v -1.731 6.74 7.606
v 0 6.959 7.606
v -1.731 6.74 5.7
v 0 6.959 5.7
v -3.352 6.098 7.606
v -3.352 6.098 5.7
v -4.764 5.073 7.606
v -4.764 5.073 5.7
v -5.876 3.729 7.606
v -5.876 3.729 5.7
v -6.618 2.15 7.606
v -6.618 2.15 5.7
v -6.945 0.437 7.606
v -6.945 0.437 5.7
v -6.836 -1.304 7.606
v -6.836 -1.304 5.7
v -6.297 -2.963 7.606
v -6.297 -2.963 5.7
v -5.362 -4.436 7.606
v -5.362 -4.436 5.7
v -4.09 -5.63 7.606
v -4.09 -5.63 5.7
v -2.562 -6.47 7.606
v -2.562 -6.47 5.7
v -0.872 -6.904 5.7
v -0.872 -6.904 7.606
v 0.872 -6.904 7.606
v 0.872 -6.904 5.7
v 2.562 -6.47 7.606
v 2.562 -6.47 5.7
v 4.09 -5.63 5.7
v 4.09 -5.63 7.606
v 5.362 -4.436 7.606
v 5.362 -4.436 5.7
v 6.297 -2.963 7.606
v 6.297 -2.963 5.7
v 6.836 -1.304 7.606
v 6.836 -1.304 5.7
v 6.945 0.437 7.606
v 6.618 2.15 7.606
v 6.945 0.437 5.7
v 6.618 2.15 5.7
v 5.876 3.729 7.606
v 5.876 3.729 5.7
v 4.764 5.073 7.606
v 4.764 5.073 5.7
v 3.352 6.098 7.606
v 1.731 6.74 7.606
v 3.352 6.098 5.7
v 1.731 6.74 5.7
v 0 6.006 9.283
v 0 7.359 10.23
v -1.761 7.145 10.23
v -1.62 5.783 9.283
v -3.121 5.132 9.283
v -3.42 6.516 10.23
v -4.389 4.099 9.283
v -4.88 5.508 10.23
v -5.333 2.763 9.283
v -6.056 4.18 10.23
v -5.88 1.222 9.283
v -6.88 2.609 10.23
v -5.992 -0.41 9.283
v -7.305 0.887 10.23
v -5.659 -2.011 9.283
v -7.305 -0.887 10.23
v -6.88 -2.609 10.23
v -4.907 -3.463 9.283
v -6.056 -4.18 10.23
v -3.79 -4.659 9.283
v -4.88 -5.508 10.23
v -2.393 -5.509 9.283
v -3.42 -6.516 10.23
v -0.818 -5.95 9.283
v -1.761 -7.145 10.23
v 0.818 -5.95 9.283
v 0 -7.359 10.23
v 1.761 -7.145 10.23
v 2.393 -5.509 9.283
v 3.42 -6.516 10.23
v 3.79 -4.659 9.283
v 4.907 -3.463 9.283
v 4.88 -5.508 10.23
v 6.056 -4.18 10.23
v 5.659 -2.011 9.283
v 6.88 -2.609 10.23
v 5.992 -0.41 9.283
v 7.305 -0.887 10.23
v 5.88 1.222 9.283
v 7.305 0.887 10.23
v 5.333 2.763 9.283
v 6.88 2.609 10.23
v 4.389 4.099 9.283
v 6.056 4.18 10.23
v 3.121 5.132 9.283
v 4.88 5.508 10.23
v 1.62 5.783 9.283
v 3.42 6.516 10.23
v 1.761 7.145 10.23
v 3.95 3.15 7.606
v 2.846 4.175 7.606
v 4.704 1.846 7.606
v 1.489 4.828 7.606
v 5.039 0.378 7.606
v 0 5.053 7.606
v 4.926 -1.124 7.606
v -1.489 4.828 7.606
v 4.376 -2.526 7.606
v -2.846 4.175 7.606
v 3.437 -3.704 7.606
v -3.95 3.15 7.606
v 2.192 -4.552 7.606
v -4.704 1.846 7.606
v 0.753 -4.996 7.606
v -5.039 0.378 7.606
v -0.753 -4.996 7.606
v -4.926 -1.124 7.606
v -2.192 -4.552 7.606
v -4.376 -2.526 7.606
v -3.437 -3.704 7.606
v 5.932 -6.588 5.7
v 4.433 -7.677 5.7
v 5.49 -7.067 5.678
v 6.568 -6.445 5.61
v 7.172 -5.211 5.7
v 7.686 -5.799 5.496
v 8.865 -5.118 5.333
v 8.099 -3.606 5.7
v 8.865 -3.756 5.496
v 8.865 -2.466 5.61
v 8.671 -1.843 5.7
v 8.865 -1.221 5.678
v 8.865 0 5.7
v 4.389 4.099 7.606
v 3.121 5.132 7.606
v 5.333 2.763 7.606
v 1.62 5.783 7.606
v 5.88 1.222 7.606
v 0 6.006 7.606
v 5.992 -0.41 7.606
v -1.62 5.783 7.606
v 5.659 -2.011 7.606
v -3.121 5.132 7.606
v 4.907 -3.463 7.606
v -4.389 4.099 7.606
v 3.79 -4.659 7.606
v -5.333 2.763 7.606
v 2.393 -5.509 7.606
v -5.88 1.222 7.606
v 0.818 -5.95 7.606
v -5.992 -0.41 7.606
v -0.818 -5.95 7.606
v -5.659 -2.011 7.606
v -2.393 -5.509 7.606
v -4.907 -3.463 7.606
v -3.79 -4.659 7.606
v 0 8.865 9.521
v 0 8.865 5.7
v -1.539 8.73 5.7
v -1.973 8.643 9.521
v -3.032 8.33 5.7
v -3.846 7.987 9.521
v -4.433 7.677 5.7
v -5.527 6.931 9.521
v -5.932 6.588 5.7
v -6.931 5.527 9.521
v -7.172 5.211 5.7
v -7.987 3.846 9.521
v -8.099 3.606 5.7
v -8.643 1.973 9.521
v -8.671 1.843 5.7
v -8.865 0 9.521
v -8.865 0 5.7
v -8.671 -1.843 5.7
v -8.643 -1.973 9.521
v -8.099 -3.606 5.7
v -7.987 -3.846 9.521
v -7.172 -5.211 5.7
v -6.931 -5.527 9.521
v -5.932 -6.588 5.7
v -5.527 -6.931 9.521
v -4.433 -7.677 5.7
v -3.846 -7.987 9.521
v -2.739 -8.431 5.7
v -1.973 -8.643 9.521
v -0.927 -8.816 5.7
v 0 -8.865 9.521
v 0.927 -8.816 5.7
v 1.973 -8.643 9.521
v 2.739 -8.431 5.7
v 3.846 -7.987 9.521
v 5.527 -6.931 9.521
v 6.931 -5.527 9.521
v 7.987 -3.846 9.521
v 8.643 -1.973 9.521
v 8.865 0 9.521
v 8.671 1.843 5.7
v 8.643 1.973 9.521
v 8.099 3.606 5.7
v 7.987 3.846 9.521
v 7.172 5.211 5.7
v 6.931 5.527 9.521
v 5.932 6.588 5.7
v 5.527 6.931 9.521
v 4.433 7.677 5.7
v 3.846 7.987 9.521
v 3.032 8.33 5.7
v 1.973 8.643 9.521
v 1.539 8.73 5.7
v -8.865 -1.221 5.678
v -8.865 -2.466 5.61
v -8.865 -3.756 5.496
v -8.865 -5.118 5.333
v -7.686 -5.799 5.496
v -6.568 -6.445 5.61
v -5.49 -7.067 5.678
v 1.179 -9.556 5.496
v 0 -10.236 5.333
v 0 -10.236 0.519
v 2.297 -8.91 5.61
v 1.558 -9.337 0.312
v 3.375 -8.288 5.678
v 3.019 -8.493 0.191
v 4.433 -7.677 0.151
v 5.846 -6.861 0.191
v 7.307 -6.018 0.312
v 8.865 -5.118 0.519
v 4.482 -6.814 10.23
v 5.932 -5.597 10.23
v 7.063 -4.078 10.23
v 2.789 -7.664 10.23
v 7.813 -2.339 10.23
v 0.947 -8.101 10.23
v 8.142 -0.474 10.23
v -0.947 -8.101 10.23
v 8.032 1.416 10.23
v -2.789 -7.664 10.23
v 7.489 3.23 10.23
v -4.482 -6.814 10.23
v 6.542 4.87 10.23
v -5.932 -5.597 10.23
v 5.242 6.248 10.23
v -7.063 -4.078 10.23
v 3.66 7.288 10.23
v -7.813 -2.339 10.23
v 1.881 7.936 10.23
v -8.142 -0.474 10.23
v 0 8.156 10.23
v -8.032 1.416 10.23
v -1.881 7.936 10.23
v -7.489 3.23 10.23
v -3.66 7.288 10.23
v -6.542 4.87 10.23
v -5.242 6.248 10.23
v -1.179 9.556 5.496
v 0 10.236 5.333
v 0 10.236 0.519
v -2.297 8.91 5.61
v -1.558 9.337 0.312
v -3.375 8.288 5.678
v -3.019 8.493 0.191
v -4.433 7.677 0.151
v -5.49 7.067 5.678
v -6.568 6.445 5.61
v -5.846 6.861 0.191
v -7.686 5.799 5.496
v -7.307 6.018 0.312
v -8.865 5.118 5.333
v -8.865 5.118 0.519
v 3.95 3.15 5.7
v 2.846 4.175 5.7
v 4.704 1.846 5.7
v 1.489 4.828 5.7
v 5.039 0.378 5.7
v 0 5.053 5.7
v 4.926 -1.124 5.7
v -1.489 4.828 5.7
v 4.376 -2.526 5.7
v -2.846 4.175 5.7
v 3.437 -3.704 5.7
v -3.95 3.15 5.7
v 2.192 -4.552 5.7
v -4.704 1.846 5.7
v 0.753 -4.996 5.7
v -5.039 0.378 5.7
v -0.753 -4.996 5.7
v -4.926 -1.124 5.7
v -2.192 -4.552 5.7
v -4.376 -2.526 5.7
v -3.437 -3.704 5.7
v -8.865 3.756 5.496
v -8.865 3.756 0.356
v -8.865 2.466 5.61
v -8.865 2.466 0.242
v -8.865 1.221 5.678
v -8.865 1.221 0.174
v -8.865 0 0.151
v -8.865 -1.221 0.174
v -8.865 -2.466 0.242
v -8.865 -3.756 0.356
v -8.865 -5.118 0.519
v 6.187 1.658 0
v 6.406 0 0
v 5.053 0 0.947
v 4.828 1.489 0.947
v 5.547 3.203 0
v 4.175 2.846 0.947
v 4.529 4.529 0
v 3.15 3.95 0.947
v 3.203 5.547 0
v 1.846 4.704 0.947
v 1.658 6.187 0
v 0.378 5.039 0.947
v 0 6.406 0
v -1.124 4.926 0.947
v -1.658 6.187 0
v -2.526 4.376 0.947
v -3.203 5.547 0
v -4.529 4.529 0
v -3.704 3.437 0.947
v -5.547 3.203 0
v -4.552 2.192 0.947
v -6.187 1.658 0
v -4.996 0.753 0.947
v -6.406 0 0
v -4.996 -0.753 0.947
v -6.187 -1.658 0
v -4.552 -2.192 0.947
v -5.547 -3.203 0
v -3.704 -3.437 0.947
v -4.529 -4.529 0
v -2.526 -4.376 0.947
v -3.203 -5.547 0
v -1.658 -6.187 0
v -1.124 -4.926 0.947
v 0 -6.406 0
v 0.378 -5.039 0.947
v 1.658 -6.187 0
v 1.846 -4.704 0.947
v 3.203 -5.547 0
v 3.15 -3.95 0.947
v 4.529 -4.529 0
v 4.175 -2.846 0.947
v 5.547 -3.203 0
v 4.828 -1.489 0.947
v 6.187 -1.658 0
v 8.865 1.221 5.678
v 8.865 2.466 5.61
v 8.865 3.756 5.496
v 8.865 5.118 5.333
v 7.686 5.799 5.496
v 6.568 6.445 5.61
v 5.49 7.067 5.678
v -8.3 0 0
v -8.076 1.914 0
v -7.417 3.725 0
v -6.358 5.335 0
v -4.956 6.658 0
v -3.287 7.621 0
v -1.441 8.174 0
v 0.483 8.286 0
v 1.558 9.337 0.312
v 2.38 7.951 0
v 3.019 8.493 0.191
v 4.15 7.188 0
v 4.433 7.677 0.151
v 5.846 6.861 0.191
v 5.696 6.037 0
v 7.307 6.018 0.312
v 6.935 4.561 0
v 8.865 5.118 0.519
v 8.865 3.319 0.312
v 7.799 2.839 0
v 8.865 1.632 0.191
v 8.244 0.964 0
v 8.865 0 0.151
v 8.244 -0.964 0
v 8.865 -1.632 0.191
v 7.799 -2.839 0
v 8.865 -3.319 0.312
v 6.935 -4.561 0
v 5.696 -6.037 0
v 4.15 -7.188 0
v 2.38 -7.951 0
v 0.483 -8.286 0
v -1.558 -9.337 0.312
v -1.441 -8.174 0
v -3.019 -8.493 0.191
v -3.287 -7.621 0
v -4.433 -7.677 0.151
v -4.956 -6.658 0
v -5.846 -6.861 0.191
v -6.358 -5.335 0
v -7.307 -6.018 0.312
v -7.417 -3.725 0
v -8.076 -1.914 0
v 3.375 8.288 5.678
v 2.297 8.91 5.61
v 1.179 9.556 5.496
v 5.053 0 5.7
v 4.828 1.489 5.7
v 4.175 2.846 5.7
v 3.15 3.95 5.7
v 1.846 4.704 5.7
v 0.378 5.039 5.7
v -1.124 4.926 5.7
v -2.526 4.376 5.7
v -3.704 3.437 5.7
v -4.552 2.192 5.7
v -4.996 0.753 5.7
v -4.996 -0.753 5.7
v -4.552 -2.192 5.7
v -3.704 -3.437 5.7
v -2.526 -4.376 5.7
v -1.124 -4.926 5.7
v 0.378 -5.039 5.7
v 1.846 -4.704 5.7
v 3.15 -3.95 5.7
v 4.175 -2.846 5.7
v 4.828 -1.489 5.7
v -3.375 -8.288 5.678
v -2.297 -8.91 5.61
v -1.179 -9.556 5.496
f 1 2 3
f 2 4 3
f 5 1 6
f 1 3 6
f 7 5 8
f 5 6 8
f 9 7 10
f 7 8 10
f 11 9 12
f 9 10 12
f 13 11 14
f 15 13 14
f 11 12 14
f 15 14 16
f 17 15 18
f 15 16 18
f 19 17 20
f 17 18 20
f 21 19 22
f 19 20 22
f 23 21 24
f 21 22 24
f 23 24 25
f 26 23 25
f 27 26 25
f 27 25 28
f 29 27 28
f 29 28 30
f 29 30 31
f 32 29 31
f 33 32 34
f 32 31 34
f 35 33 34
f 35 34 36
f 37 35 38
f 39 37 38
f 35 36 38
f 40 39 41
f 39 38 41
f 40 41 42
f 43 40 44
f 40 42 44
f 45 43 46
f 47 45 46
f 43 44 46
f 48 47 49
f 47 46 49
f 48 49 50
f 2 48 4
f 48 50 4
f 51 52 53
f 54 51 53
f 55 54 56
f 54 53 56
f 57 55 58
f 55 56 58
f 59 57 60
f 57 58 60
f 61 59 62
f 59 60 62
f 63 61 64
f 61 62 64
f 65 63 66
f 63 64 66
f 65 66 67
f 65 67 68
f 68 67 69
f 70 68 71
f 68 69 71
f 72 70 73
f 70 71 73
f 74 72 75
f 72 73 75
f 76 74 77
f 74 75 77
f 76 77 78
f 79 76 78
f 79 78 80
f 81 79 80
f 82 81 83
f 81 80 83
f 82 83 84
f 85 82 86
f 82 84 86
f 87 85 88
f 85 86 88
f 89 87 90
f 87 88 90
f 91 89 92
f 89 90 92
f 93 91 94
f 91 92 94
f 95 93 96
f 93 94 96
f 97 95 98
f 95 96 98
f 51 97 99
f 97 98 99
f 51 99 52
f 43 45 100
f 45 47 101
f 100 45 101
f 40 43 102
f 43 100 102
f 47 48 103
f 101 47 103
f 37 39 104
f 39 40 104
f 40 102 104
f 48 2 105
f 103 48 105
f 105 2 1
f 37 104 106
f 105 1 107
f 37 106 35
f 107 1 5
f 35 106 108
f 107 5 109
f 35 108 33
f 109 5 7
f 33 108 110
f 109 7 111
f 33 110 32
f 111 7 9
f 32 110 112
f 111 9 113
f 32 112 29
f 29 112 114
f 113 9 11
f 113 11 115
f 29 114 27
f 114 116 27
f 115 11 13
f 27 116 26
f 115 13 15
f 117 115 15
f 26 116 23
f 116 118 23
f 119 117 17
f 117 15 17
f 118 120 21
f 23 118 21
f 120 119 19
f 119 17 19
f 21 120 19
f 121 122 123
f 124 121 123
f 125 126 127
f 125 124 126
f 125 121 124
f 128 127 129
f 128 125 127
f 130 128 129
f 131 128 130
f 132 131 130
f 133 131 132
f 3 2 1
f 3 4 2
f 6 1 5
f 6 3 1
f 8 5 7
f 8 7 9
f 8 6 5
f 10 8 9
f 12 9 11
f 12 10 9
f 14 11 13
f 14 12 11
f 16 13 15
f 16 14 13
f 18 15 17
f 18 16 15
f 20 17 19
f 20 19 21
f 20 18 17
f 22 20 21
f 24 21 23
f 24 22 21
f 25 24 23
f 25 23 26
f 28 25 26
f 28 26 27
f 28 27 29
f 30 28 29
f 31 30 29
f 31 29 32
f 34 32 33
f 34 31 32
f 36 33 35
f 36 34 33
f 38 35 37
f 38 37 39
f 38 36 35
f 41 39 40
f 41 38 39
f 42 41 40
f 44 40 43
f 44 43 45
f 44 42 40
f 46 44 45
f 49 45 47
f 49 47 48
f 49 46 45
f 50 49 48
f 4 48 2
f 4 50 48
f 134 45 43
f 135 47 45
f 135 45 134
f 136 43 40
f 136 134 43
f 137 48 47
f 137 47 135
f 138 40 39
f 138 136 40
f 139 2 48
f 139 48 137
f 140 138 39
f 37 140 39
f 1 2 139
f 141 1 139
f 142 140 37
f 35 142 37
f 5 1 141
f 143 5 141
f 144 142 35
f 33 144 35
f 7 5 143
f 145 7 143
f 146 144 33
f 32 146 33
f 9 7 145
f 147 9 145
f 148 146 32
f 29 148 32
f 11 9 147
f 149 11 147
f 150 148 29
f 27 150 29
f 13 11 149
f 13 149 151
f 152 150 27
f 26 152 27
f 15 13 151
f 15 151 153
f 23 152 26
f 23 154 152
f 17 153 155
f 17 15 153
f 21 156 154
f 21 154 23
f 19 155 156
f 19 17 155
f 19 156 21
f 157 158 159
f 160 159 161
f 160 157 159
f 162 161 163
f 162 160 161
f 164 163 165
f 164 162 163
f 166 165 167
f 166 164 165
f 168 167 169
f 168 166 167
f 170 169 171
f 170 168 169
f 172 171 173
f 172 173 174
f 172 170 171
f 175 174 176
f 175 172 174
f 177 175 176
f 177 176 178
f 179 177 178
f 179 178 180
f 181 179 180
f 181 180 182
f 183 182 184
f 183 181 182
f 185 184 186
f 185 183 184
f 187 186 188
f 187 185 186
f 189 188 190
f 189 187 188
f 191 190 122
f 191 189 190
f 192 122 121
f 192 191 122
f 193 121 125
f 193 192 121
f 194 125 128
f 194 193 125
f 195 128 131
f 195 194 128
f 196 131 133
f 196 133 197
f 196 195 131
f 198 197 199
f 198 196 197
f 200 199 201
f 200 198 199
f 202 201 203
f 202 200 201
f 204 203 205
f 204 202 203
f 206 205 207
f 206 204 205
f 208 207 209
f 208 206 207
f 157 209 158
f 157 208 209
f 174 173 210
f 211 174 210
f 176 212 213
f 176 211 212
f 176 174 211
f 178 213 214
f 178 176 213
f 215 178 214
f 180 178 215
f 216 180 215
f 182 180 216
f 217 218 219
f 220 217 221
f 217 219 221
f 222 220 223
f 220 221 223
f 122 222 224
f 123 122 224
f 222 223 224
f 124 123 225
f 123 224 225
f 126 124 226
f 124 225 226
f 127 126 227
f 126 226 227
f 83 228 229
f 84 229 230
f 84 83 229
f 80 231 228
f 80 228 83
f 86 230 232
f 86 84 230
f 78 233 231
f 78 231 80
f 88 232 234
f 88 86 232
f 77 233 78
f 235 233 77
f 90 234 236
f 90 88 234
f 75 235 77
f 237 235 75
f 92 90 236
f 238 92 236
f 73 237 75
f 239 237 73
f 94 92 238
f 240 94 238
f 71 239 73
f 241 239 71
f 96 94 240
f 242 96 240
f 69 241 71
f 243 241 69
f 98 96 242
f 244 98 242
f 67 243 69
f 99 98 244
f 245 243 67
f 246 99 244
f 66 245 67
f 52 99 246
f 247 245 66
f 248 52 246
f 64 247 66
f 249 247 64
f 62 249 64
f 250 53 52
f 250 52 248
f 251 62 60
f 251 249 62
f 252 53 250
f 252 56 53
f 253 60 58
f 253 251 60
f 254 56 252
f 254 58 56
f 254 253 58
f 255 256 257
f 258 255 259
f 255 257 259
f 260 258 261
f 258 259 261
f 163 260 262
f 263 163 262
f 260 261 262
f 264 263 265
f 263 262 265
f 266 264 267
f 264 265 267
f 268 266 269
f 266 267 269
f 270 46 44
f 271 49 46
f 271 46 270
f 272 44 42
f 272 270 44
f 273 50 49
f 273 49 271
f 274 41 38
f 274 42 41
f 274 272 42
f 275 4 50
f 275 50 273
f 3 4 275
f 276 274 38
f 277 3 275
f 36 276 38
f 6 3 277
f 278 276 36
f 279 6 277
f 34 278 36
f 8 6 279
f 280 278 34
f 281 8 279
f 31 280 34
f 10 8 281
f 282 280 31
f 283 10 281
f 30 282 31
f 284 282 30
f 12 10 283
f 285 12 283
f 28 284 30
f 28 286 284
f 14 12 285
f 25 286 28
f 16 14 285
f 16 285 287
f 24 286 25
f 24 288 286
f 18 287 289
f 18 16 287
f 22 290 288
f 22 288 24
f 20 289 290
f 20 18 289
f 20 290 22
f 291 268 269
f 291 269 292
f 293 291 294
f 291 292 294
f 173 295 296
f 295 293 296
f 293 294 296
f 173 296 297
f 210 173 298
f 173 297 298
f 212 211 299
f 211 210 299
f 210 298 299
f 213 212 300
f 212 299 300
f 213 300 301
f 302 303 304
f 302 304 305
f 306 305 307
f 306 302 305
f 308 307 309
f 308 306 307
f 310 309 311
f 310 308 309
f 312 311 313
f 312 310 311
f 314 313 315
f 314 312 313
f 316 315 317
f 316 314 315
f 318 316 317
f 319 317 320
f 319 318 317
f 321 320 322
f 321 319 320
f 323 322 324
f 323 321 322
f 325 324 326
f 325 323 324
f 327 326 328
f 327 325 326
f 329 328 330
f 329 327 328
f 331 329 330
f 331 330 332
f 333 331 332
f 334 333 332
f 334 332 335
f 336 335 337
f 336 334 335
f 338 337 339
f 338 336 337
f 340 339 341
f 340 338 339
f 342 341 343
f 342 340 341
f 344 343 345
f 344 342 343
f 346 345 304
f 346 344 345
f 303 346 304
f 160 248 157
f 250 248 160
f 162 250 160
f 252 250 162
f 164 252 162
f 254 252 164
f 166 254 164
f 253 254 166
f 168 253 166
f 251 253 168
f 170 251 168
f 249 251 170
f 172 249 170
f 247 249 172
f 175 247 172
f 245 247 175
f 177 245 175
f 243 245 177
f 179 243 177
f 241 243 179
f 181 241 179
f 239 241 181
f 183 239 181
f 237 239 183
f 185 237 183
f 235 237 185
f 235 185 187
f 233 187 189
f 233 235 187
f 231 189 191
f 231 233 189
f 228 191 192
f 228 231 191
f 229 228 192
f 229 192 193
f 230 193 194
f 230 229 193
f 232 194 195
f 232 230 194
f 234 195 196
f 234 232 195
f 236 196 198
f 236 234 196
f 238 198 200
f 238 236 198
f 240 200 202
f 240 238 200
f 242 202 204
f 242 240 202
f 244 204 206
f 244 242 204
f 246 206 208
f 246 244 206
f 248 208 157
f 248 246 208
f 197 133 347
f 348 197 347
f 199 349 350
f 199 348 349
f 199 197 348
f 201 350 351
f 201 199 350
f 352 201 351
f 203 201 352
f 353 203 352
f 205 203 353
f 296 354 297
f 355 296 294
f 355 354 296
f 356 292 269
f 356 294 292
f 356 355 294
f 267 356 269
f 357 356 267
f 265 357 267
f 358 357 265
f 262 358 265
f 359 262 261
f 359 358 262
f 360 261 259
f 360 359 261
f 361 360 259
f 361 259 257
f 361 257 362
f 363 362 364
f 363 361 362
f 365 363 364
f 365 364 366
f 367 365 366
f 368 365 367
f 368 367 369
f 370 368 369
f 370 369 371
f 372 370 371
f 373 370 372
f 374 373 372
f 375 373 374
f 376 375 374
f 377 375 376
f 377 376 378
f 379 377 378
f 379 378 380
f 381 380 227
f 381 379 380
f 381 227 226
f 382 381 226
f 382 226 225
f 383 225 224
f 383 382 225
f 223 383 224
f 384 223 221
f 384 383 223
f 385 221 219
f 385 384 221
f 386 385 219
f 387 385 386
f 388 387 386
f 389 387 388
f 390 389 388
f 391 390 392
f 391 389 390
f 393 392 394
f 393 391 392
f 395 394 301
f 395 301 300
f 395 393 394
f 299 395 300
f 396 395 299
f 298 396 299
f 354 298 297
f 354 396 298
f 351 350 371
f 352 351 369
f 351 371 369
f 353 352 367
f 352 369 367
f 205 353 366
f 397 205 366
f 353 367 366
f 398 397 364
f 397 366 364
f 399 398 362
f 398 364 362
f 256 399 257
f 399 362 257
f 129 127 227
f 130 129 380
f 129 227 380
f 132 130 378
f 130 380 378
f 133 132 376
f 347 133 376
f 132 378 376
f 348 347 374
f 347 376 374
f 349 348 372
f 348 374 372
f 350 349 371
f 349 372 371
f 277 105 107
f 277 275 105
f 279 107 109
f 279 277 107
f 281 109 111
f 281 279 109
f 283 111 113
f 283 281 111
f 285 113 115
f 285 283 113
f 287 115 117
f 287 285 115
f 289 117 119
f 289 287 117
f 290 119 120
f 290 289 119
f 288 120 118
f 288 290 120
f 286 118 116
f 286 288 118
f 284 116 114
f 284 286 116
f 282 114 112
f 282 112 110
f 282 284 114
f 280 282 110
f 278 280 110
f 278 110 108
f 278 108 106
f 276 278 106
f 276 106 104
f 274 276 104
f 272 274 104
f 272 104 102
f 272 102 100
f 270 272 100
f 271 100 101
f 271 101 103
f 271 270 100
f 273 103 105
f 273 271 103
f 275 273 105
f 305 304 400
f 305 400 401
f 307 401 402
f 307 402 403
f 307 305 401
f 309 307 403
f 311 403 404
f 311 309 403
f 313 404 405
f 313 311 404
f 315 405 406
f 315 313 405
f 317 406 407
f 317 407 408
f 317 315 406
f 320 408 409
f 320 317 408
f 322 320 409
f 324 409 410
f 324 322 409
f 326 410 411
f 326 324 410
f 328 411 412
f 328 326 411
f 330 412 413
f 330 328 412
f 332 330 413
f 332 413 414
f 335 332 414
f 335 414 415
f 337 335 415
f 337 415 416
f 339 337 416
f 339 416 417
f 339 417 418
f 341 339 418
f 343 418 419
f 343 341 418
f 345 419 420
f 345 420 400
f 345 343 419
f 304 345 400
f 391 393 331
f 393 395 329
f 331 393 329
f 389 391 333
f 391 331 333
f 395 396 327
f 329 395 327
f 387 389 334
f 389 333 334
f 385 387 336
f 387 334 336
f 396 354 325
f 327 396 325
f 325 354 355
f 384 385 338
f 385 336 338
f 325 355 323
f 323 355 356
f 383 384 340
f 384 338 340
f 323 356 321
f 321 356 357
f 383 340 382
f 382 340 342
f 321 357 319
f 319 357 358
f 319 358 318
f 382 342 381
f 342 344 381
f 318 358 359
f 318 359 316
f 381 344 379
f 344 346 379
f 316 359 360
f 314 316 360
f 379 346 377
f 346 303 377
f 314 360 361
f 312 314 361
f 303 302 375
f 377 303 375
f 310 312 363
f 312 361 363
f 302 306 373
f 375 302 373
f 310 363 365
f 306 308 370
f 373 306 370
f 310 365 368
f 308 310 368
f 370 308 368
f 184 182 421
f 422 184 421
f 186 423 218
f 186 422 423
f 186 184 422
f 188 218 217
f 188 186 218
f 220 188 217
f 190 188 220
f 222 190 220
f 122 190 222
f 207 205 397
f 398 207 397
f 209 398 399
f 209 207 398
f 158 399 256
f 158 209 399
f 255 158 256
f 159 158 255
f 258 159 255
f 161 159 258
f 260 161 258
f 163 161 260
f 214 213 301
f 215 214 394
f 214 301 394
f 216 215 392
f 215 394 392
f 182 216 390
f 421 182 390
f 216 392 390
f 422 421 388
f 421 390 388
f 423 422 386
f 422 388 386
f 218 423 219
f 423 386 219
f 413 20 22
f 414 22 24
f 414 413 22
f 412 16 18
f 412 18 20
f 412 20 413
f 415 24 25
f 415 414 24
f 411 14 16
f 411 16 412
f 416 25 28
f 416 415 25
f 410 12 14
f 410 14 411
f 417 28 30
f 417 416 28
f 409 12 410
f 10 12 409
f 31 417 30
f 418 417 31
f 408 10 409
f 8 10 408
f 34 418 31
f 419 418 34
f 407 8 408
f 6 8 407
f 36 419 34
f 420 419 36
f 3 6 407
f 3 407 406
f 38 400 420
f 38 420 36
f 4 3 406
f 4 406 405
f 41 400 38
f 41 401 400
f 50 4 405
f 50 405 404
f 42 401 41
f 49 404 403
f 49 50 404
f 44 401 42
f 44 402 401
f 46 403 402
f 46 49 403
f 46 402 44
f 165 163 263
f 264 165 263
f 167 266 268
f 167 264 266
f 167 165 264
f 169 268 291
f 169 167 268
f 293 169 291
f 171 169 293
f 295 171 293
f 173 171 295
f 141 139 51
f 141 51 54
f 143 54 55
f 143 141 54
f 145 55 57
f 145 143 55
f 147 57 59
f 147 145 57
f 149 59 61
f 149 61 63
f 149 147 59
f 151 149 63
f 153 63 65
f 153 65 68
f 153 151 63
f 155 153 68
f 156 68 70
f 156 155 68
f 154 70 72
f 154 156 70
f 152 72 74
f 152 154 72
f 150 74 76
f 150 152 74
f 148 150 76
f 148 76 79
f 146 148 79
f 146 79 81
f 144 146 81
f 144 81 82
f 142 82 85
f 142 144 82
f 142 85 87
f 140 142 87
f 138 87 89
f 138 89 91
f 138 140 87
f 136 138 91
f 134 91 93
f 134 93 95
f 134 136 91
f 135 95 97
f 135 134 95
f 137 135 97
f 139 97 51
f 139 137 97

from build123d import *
from OCP.BRepFilletAPI import BRepFilletAPI_MakeChamfer

# Parameters (mm, degrees)
SKETCH_1_R          = 5.0528125
EXTRUDE_204_DEPTH   = 5.7
SKETCH_8_OUTSIDE_W  = 142.394
SKETCH_8_OUTSIDE_H  = 145.136
SKETCH_8_OUTSIDE_R  = 8.3
CUT_EXTRUDE_4_DEPTH = 15.692260718
CUT_EXTRUDE_4_DRAFT = -75
SKETCH_11_R         = 17.73
SKETCH_11_R_2       = 8.865
CUT_EXTRUDE_5_DEPTH = 1
CUT_EXTRUDE_5_DRAFT = -75
SKETCH_10_W         = 1.90609375
SKETCH_10_H         = 1.90609375
CHAMFER_1_SIZE      = 0.7092
CHAMFER_2_SIZE      = 0.9471875
CHAMFER_2_SIZE2     = 1.35272394


with BuildPart() as part:
    # 草图1 → Extrude 204 (new body)
    with BuildSketch(Plane.XY):
        Polygon((0, 10.236420273), (-8.865, 5.118210136), (-8.865, -5.118210136), (0, -10.236420273), (8.865, -5.118210136), (8.865, 5.118210136), align=None)
        Circle(SKETCH_1_R, mode=Mode.SUBTRACT)
    extrude(amount=EXTRUDE_204_DEPTH)


with BuildPart() as cut_extrude_4_tool:
    # 草图8 outside → 切除-拉伸4 (with draft: the straight prism first)
    with BuildSketch(Plane(origin=(0, 0, 0), x_dir=(-1, 0, 0), z_dir=(0, 0, -1))):
        Rectangle(SKETCH_8_OUTSIDE_W, SKETCH_8_OUTSIDE_H)
        Circle(SKETCH_8_OUTSIDE_R, mode=Mode.SUBTRACT)
    extrude(amount=-CUT_EXTRUDE_4_DEPTH)
    # 切除-拉伸4: the draft: its side faces are tilted about the plane it starts from
    cut_extrude_4_sides = [cut_extrude_4_tool.faces().sort_by_distance(p)[0] for p in [
        (0, -72.568, 7.846130359),
        (-71.197, 0, 7.846130359),
        (0, 72.568, 7.846130359),
        (71.197, 0, 7.846130359),
        (8.3, 0, 7.846130359),
    ]]
    draft(cut_extrude_4_sides, Plane(origin=(0, 0, 0), x_dir=(-1, 0, 0), z_dir=(0, 0, -1)), CUT_EXTRUDE_4_DRAFT)


with BuildPart() as part_1:
    add(part.part)

    # 切除-拉伸4: cut by cut_extrude_4_tool
    add(cut_extrude_4_tool.part, mode=Mode.SUBTRACT)


with BuildPart() as cut_extrude_5_tool:
    # 草图11 → 切除-拉伸5 (with draft: the straight prism first)
    with BuildSketch(Plane.XY.offset(5.7)):
        Circle(SKETCH_11_R)
        Circle(SKETCH_11_R_2, mode=Mode.SUBTRACT)
    extrude(amount=-CUT_EXTRUDE_5_DEPTH)
    # 切除-拉伸5: the draft: its side faces are tilted about the plane it starts from
    cut_extrude_5_sides = [cut_extrude_5_tool.faces().sort_by_distance(p)[0] for p in [
        (-17.73, 0, 5.2),
        (-8.865, 0, 5.2),
    ]]
    draft(cut_extrude_5_sides, Plane.XY.offset(5.7), CUT_EXTRUDE_5_DRAFT)


with BuildPart() as part_2:
    add(part_1.part)

    # 切除-拉伸5: cut by cut_extrude_5_tool
    add(cut_extrude_5_tool.part, mode=Mode.SUBTRACT)

    # 草图9 → 旋转1 (revolve)
    with BuildSketch(Plane(origin=(0, 0, 0), x_dir=(0, 0, -1), z_dir=(1, 0, 0))):
        Polygon((-5.7, 8.865), (-10.23, 8.865), (-10.23, 6.005859375), (-7.60609375, 6.005859375), (-7.60609375, 6.95890625), (-5.7, 6.95890625), align=None)
    revolve(axis=Axis((0, 0, 0), (0, 0, 1)))

    # 倒角1
    chamfer_1_edges = [part_2.edges().sort_by_distance(p)[0] for p in [
        (0, -8.865, 10.23),
    ]]
    chamfer(chamfer_1_edges, length=CHAMFER_1_SIZE)

    # 倒角2: one chamfer whose edges measure the first distance from different faces: ONE call of the kernel's chamfer builder (chamfer() names one face for all edges)
    chamfer_2_edges_1 = [part_2.edges().sort_by_distance(p)[0] for p in [
        (-5.0528125, 0, 0),
    ]]
    chamfer_2_side_1 = [part_2.faces().sort_by_distance(p)[0] for p in [
        (-5.0528125, 0, 2.85),
    ]]
    chamfer_2_edges_2 = [part_2.edges().sort_by_distance(p)[0] for p in [
        (0, -6.005859375, 10.23),
    ]]
    chamfer_2_side_2 = [part_2.faces().sort_by_distance(p)[0] for p in [
        (0, -6.005859375, 8.918046875),
    ]]
    chamfer_2 = BRepFilletAPI_MakeChamfer(part_2.part.solid().wrapped)
    for e in chamfer_2_edges_1:
        chamfer_2.Add(CHAMFER_2_SIZE, CHAMFER_2_SIZE2, e.wrapped, chamfer_2_side_1[0].wrapped)  # the first distance lies on this face
    for e in chamfer_2_edges_2:
        chamfer_2.Add(CHAMFER_2_SIZE, CHAMFER_2_SIZE2, e.wrapped, chamfer_2_side_2[0].wrapped)  # the first distance lies on this face
    add(Compound.cast(chamfer_2.Shape()), mode=Mode.REPLACE)


with BuildPart() as body_2:
    # 草图10 → 旋转2 (revolve)
    with BuildSketch(Plane(origin=(0, 0, 0), x_dir=(0, 0, -1), z_dir=(1, 0, 0))):
        with Locations((-6.653046875, 6.005859375)):
            Rectangle(SKETCH_10_W, SKETCH_10_H)
    revolve(axis=Axis((0, 0, 0), (0, 0, 1)))


solid = Compound([part_2.part, body_2.part])
